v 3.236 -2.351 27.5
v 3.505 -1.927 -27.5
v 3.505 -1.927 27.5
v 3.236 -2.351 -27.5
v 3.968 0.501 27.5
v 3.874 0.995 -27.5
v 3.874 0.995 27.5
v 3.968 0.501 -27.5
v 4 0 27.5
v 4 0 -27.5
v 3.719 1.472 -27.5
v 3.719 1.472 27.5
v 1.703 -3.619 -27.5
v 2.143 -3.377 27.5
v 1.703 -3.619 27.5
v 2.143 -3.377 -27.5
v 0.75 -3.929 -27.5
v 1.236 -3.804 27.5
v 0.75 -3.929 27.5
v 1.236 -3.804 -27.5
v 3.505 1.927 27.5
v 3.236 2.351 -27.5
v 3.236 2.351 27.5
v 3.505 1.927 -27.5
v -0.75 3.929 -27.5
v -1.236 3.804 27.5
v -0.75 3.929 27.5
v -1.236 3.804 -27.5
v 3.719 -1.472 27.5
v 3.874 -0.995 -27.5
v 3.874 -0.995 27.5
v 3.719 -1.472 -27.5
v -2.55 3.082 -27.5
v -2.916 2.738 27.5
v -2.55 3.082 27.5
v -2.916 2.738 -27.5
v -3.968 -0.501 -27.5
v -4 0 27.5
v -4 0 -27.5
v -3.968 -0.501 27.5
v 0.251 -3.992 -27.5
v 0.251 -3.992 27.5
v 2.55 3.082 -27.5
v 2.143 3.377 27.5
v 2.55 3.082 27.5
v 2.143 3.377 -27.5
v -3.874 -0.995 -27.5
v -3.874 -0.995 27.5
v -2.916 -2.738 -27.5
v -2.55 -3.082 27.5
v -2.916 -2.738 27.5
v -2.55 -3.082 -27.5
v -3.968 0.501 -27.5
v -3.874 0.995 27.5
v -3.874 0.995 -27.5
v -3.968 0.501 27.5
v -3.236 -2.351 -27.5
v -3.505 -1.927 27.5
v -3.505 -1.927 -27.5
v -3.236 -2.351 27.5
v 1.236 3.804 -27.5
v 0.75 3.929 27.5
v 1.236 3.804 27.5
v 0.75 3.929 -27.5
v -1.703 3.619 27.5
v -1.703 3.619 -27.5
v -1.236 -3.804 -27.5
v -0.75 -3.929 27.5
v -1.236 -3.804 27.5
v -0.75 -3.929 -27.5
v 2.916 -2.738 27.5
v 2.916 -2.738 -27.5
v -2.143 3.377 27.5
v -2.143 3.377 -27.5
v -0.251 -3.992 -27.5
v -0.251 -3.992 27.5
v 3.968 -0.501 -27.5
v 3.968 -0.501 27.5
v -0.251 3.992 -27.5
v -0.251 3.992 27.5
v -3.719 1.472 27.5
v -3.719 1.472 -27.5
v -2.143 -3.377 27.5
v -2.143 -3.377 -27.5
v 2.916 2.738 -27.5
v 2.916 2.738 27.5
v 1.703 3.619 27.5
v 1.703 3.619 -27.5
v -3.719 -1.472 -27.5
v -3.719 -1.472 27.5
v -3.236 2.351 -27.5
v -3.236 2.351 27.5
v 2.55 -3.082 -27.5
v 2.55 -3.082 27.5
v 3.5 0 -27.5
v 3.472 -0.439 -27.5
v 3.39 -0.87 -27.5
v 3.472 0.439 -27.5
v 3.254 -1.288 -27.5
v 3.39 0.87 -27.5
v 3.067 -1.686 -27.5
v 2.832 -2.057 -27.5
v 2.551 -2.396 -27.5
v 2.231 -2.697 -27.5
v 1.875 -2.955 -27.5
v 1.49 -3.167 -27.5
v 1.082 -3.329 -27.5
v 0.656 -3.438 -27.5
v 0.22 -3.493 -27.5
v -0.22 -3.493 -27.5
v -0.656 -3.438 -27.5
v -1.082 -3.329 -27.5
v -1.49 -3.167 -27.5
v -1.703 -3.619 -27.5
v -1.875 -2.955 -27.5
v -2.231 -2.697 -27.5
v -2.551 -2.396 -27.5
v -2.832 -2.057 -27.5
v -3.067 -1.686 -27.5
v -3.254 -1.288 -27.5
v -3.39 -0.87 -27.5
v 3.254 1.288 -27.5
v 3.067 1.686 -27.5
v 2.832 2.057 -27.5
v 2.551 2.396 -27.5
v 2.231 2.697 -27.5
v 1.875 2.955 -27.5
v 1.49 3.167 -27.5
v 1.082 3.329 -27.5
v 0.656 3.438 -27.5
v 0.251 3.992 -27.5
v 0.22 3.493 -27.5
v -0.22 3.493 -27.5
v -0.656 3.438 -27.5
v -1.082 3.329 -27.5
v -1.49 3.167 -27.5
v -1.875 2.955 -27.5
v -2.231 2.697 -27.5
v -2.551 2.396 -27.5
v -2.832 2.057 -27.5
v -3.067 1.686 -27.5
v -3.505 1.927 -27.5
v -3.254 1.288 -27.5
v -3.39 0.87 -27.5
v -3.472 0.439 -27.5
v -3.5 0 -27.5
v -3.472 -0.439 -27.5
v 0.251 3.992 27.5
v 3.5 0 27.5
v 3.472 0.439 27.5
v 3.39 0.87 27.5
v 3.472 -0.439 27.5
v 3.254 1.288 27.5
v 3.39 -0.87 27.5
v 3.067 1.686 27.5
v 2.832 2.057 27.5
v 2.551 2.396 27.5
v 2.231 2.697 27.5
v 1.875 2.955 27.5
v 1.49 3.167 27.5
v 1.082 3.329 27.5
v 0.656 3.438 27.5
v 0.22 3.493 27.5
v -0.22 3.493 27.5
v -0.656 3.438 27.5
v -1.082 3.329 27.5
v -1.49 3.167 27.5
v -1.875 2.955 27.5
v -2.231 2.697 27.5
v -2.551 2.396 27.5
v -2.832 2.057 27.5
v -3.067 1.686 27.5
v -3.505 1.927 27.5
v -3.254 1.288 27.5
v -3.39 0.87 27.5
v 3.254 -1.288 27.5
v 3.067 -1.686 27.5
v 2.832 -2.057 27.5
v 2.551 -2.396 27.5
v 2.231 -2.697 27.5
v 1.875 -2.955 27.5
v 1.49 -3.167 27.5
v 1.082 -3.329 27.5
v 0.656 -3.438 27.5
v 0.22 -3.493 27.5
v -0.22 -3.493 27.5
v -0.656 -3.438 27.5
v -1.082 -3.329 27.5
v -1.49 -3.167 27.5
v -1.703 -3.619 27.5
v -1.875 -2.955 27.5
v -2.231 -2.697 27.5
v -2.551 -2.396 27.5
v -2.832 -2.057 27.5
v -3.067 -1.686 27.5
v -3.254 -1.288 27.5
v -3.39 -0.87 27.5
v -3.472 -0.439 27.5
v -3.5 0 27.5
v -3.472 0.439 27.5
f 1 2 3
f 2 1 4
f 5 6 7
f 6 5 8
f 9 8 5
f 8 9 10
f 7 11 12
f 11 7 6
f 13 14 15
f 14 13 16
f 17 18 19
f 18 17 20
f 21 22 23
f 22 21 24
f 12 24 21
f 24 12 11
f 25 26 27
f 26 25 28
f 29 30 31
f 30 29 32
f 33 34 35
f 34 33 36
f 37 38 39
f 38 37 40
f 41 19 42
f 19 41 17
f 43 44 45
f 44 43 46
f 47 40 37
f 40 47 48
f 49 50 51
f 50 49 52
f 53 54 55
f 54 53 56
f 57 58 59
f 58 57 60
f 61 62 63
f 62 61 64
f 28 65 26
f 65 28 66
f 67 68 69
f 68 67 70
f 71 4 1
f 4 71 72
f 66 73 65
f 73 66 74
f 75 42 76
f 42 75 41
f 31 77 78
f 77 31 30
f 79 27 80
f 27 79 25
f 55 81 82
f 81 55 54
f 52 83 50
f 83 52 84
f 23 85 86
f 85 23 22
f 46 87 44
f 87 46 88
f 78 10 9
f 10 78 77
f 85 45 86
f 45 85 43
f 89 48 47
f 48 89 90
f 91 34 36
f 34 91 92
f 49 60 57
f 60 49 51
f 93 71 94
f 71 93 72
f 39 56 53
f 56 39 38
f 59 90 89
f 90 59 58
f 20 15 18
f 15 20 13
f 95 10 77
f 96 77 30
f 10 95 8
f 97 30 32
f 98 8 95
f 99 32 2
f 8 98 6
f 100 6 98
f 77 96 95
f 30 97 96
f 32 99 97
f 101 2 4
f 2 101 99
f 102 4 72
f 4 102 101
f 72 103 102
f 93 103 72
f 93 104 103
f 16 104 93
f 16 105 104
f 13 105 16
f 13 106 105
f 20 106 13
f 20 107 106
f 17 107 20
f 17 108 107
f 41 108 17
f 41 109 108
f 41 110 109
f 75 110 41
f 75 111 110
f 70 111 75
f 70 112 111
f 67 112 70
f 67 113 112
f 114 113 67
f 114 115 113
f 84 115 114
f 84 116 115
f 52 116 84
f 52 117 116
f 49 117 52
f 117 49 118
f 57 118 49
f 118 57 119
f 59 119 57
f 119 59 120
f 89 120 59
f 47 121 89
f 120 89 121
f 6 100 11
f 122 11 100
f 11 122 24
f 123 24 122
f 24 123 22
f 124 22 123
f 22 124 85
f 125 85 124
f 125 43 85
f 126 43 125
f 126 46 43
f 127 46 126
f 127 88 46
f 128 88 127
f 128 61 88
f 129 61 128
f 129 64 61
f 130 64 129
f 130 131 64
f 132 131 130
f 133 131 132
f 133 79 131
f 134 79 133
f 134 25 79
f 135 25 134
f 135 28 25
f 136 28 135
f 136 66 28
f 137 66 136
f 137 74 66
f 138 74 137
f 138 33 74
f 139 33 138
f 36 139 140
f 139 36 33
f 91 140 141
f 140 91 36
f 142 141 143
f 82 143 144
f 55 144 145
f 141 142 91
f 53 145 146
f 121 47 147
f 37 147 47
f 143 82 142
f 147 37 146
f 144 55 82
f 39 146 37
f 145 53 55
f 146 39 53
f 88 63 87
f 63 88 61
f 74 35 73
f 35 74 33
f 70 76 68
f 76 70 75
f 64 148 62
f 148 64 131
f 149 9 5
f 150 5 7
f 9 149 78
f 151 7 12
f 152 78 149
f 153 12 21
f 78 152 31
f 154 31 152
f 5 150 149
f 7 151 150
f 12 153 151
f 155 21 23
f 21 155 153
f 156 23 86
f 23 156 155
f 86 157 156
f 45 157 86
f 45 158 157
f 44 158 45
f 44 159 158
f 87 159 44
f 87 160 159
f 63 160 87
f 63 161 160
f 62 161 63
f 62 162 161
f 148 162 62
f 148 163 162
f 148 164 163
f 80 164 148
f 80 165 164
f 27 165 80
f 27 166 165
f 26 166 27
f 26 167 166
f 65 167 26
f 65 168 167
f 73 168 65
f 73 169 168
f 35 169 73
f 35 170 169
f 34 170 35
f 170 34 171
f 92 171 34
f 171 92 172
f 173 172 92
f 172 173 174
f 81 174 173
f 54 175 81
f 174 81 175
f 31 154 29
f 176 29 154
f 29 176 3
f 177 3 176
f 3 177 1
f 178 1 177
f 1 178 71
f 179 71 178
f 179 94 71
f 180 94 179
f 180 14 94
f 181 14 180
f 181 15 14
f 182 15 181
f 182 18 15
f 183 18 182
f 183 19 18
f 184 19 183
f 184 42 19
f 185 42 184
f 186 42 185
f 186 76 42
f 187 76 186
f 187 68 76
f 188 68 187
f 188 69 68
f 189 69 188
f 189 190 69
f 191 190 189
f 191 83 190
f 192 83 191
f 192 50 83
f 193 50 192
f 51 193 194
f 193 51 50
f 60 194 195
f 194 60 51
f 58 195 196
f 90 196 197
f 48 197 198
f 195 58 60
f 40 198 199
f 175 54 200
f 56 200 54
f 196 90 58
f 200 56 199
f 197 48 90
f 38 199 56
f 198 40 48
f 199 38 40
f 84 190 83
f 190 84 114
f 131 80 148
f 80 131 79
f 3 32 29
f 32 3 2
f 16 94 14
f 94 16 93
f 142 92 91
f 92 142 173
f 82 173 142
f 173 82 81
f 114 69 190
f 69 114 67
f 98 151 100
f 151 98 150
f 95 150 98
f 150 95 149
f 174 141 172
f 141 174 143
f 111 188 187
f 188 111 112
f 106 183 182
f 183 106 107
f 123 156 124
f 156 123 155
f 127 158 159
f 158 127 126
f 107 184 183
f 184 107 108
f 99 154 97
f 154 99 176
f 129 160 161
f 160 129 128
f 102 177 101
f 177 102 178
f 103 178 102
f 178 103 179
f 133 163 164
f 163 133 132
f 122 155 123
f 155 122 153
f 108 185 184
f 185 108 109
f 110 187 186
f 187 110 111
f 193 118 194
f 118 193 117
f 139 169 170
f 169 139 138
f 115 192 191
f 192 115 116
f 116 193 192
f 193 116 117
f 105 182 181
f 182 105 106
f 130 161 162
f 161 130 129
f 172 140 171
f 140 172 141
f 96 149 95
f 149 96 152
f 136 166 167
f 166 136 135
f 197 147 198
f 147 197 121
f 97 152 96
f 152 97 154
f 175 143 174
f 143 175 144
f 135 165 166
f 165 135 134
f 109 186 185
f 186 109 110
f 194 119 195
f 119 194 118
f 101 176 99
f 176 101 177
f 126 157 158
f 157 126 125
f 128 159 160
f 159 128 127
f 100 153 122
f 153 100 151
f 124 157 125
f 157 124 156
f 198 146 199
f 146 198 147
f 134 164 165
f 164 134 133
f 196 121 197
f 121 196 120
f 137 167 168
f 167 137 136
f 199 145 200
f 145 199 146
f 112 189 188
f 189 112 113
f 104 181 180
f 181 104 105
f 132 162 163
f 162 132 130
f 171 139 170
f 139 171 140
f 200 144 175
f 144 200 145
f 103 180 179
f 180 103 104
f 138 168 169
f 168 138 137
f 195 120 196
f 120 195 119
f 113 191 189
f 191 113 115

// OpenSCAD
$fn = 50;


difference() {
	union() {
		translate(v = [0, 0, -27.5000000000]) {
			cylinder(h = 55, r = 4.0000000000);
		}
	}
	union() {
		translate(v = [0, 0, -100.0000000000]) {
			cylinder(h = 200, r = 3.5000000000);
		}
	}
}
